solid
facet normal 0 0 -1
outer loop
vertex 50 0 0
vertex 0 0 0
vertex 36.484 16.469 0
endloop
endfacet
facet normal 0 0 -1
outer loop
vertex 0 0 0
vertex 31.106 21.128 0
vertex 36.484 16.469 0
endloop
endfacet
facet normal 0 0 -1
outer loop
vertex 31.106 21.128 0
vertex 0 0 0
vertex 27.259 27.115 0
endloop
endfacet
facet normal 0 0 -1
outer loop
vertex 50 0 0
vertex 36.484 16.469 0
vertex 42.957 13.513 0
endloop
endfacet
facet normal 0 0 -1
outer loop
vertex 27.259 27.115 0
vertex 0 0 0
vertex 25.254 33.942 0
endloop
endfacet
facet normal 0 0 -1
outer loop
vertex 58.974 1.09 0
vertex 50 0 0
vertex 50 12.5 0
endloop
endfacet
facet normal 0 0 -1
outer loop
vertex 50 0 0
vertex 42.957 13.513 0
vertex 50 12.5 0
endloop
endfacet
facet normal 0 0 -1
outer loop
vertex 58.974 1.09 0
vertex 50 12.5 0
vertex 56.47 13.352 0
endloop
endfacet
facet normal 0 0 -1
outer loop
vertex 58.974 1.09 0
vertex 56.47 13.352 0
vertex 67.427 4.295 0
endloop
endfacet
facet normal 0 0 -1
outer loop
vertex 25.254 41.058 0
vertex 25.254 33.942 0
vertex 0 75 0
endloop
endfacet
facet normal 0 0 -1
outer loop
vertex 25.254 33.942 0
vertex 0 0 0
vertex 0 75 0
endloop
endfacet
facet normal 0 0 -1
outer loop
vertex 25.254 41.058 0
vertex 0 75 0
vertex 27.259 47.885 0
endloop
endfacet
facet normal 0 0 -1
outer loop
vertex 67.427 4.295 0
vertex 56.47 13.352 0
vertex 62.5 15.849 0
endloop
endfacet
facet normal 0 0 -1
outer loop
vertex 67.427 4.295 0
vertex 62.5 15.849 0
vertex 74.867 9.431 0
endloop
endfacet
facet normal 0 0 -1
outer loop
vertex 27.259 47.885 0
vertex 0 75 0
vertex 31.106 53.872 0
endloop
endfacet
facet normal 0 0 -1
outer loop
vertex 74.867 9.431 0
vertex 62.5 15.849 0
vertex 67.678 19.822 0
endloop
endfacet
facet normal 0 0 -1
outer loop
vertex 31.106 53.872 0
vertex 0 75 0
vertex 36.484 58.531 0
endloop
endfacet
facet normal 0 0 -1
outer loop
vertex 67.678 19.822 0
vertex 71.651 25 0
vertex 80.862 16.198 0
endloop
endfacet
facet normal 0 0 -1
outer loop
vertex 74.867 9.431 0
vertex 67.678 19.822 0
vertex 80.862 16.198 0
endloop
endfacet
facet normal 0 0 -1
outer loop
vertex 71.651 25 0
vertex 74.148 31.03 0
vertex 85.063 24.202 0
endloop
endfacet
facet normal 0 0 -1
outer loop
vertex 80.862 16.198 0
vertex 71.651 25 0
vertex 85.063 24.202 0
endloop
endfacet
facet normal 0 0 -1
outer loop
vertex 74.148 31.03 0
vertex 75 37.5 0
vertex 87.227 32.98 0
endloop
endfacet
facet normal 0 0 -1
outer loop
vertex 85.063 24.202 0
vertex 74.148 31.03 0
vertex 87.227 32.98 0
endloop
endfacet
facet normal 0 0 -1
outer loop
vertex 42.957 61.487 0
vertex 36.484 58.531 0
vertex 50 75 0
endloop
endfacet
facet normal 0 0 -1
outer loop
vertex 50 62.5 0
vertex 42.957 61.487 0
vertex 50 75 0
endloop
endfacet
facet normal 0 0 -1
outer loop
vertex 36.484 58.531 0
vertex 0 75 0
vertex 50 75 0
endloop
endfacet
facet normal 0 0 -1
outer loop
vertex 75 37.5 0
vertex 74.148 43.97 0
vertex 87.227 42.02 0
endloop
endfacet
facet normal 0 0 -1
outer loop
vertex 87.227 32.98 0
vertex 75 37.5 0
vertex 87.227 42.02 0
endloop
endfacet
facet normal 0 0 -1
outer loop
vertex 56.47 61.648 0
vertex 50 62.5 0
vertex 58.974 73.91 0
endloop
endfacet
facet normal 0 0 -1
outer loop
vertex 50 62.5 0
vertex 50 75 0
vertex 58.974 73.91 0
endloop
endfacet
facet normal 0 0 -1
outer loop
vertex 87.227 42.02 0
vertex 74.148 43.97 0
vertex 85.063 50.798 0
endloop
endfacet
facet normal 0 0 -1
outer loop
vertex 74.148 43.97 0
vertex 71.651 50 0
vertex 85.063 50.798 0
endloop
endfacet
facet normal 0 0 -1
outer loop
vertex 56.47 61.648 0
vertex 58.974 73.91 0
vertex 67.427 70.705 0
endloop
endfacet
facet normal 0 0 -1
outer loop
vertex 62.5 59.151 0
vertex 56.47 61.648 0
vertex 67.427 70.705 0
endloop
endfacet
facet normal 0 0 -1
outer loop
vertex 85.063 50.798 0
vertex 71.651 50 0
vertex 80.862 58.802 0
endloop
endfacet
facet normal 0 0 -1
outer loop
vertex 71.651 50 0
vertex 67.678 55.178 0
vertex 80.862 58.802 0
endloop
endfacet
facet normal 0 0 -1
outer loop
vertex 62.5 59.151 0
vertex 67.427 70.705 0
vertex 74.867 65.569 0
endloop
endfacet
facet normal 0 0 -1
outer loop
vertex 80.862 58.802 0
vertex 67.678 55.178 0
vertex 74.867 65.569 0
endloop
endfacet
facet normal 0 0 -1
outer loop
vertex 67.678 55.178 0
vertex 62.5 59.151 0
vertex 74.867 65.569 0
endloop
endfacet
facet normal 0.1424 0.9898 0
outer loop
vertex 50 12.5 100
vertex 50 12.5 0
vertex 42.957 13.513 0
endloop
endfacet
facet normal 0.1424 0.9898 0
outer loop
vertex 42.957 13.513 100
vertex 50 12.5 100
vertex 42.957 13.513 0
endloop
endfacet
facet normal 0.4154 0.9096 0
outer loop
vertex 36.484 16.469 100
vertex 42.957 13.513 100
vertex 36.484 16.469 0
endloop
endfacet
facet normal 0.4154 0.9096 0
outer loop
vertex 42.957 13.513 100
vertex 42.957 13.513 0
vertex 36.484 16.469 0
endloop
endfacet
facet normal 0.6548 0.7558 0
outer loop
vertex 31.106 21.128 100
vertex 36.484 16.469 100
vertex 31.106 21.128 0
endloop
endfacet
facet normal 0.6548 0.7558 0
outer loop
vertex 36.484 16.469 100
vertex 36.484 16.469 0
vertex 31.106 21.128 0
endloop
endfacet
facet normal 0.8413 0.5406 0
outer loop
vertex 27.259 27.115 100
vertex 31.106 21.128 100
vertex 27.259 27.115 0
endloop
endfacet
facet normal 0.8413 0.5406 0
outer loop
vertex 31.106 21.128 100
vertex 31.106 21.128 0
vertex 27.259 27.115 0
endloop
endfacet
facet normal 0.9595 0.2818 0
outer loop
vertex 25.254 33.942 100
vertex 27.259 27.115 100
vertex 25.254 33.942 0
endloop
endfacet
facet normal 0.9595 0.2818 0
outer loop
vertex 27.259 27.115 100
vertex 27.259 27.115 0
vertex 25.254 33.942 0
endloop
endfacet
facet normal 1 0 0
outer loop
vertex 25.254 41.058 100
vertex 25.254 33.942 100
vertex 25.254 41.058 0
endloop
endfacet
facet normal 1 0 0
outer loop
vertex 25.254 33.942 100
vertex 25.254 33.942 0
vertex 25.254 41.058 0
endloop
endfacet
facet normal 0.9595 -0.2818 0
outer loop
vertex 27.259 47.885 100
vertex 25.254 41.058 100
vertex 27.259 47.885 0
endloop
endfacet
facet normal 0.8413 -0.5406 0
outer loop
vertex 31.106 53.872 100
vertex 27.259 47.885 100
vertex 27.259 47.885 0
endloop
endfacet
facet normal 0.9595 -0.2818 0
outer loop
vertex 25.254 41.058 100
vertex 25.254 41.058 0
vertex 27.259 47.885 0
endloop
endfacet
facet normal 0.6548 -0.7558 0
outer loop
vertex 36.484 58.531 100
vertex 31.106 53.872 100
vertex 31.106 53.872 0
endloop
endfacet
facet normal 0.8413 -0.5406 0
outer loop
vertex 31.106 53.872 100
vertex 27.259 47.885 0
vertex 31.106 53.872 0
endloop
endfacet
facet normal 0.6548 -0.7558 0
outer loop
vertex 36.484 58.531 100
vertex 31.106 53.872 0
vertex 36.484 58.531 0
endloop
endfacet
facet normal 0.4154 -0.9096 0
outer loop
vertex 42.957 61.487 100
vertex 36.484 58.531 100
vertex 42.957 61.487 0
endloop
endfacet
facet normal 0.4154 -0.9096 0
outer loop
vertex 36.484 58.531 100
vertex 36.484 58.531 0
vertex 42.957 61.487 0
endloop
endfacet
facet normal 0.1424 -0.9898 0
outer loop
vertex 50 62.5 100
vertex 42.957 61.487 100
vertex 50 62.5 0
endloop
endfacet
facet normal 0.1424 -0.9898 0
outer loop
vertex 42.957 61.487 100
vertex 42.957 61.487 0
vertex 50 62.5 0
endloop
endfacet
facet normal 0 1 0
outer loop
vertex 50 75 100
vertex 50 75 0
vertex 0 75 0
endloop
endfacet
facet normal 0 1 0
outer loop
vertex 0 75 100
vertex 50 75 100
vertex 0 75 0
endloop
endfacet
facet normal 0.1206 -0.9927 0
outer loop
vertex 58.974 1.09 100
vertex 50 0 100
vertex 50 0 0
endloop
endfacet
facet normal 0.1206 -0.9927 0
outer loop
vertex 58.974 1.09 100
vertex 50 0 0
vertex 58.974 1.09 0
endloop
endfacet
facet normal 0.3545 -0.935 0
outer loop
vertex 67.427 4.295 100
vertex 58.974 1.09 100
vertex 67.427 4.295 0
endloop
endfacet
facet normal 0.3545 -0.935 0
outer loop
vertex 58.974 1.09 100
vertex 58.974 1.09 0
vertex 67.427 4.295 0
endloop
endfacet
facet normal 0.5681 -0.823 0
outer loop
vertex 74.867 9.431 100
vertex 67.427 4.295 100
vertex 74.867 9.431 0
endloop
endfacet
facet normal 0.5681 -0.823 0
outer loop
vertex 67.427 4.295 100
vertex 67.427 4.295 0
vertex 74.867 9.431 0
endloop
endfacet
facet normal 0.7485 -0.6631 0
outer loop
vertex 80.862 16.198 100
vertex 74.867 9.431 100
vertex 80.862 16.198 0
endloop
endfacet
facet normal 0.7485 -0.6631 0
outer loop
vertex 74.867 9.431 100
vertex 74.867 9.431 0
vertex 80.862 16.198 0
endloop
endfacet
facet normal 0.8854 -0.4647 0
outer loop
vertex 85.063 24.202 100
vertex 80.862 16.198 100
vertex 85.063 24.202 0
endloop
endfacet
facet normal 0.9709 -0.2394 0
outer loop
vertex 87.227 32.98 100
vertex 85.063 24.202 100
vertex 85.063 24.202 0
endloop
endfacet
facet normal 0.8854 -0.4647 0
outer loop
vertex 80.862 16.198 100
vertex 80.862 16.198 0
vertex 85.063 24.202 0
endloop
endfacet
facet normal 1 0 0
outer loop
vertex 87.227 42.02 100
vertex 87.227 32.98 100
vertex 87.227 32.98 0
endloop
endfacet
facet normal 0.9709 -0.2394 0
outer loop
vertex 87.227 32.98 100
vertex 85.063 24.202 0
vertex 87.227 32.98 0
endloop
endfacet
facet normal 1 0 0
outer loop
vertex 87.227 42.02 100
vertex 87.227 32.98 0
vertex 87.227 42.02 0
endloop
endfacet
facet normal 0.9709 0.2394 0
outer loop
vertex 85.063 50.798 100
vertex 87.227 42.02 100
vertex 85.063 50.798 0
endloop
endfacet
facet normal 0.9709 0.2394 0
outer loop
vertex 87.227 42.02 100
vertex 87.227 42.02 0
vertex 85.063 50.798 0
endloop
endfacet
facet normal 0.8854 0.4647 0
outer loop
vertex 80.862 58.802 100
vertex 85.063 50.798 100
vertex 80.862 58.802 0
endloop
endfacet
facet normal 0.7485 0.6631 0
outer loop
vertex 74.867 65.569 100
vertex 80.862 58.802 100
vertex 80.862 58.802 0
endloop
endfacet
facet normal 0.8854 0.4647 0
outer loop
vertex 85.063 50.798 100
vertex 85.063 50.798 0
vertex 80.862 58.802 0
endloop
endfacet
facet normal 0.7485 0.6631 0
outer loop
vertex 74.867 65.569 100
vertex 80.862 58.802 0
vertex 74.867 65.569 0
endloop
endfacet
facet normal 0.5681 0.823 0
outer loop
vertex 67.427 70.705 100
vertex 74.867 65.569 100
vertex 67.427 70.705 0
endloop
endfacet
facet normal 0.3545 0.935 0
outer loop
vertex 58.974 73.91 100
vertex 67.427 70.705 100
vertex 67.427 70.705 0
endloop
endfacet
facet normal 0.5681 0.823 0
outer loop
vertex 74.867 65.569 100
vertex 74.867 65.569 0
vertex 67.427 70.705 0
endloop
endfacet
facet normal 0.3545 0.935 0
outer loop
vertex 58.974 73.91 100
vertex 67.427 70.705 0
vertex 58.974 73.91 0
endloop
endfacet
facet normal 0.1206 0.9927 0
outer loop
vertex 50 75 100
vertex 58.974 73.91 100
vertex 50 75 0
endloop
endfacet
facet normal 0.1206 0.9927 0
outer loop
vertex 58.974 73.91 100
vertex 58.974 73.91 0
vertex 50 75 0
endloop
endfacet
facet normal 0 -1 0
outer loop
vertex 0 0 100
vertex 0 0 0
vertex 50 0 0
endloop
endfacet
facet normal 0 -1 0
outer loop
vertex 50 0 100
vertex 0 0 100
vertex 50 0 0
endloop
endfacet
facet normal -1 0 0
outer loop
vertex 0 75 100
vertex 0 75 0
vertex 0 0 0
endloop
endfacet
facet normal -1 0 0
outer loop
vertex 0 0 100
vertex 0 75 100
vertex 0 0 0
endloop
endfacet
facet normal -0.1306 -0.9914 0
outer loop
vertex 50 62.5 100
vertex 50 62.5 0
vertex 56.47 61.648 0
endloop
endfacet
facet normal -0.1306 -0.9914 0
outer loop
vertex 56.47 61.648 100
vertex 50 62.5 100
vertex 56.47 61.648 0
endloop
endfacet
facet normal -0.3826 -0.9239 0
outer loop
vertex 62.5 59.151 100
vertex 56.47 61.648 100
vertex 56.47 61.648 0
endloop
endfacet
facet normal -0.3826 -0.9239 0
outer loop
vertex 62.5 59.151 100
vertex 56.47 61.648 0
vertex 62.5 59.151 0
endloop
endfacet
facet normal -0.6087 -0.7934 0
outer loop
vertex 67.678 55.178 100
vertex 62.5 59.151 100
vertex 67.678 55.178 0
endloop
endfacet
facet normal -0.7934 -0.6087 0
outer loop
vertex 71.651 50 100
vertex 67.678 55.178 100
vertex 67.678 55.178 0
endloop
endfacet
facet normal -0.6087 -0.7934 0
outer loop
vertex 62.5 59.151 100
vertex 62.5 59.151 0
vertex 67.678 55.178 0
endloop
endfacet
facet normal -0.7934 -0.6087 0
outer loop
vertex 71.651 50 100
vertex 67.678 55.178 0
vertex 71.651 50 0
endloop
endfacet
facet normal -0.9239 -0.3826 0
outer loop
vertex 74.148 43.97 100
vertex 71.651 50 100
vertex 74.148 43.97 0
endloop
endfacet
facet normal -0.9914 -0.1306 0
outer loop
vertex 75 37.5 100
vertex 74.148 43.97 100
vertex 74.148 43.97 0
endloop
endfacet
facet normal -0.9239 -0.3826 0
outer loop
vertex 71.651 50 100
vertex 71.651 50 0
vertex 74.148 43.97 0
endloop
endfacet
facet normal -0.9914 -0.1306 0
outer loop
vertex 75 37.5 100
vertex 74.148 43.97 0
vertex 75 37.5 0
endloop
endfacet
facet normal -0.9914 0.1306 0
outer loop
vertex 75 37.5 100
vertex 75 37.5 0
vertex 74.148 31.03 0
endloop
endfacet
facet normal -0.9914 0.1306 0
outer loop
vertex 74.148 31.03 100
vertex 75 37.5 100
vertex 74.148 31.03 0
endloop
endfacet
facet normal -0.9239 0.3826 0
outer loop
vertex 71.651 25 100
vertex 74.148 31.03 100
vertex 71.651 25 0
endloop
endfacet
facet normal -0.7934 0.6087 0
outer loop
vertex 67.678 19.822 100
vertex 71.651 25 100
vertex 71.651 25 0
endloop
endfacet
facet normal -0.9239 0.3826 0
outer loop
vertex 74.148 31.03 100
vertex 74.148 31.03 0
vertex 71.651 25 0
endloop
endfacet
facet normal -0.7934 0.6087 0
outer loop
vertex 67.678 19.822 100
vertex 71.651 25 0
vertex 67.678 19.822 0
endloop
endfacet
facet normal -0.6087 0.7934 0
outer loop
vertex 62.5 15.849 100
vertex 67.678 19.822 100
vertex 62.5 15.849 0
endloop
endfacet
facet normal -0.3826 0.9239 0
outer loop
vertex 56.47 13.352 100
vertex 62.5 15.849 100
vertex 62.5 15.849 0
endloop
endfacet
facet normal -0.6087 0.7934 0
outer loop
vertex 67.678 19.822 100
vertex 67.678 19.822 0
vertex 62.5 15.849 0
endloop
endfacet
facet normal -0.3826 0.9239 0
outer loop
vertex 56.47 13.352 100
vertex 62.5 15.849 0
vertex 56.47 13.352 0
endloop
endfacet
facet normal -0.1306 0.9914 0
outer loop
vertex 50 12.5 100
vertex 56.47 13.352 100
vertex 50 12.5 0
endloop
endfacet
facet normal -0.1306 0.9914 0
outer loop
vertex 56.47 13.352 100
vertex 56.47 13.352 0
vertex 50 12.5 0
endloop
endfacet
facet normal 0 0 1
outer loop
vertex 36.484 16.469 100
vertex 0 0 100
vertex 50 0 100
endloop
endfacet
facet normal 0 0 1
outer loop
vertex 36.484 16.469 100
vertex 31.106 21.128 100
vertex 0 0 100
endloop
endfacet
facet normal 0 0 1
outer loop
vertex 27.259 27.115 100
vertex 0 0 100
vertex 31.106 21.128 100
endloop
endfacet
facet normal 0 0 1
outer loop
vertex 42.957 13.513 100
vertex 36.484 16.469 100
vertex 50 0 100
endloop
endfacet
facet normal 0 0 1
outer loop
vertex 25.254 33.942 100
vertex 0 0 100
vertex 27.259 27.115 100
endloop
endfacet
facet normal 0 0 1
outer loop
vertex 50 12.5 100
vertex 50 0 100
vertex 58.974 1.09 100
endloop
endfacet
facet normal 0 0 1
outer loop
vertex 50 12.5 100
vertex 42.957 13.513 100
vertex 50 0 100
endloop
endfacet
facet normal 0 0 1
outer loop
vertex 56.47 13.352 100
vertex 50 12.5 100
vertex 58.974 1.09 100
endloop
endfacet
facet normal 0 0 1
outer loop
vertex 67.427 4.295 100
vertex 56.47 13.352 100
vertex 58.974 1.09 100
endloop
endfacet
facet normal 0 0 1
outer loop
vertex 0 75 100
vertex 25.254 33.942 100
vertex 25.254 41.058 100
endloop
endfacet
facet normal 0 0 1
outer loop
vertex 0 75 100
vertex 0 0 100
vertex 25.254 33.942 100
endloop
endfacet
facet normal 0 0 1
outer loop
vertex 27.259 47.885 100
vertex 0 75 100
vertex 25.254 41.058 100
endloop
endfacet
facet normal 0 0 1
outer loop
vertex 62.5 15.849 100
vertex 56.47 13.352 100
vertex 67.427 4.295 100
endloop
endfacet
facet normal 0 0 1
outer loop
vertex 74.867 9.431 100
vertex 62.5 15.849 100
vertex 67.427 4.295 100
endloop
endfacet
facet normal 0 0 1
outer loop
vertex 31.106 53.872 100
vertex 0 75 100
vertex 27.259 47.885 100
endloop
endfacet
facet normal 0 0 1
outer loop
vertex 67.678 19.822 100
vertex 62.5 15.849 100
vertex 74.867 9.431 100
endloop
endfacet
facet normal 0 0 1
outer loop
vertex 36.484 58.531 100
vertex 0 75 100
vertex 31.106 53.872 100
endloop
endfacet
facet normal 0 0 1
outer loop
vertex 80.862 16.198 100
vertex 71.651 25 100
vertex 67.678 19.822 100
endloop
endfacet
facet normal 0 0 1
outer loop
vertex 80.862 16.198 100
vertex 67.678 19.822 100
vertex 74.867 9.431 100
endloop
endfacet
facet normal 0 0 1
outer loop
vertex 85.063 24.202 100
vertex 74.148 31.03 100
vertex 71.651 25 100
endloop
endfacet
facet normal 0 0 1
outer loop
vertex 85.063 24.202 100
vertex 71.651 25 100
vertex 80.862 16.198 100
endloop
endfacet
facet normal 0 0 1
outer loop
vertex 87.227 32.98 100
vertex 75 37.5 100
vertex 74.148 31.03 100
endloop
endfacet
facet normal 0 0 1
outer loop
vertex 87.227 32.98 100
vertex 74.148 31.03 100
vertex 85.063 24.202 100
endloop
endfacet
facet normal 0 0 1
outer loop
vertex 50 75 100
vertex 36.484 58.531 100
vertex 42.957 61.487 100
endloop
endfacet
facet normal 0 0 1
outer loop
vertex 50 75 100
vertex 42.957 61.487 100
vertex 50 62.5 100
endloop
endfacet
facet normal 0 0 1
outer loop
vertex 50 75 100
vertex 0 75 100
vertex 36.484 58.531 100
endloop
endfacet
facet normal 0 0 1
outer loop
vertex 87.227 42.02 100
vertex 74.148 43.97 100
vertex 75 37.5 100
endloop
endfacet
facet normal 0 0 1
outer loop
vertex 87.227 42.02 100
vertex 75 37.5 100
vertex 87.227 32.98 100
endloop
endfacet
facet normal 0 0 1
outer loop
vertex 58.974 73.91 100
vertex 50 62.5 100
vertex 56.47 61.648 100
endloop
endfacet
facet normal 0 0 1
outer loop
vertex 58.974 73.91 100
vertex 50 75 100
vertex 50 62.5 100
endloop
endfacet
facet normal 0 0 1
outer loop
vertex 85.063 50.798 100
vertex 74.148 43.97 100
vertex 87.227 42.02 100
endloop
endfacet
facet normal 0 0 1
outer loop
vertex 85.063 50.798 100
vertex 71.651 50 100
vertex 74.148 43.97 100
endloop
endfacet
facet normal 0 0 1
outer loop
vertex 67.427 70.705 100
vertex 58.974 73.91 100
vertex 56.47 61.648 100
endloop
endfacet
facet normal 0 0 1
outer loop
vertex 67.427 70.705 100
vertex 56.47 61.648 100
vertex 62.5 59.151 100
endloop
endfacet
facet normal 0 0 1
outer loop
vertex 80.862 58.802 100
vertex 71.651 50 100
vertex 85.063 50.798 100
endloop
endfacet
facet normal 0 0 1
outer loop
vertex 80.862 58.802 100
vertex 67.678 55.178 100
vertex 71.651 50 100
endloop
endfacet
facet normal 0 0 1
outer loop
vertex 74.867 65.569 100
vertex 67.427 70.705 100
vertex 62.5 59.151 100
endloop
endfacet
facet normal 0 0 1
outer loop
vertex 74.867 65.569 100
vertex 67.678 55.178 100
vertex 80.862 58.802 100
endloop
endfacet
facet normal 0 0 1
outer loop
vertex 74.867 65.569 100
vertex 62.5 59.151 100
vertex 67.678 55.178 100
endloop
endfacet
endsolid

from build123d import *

# Parameters (mm, degrees)
F1_DEPTH = 100


with BuildPart() as f1:
    # F0 (on Top) → F1 (new body)
    with BuildSketch(Plane.XY):
        with BuildLine():
            Line((0, 75), (0, 0))
            Line((0, 0), (50, 0))
            Line((50, 0), (50, 12.5))
            ThreePointArc((50, 12.5), (25, 37.5), (50, 62.5))
            Line((50, 62.5), (50, 75))
            Line((50, 75), (0, 75))
        make_face()
        with BuildLine():
            Line((50, 12.5), (50, 0))
            ThreePointArc((50, 0), (87.5, 37.5), (50, 75))
            Line((50, 75), (50, 62.5))
            ThreePointArc((50, 62.5), (67.67767, 55.17767), (75, 37.5))
            ThreePointArc((75, 37.5), (67.67767, 19.82233), (50, 12.5))
        make_face()
    extrude(amount=F1_DEPTH)


solid = f1.part
